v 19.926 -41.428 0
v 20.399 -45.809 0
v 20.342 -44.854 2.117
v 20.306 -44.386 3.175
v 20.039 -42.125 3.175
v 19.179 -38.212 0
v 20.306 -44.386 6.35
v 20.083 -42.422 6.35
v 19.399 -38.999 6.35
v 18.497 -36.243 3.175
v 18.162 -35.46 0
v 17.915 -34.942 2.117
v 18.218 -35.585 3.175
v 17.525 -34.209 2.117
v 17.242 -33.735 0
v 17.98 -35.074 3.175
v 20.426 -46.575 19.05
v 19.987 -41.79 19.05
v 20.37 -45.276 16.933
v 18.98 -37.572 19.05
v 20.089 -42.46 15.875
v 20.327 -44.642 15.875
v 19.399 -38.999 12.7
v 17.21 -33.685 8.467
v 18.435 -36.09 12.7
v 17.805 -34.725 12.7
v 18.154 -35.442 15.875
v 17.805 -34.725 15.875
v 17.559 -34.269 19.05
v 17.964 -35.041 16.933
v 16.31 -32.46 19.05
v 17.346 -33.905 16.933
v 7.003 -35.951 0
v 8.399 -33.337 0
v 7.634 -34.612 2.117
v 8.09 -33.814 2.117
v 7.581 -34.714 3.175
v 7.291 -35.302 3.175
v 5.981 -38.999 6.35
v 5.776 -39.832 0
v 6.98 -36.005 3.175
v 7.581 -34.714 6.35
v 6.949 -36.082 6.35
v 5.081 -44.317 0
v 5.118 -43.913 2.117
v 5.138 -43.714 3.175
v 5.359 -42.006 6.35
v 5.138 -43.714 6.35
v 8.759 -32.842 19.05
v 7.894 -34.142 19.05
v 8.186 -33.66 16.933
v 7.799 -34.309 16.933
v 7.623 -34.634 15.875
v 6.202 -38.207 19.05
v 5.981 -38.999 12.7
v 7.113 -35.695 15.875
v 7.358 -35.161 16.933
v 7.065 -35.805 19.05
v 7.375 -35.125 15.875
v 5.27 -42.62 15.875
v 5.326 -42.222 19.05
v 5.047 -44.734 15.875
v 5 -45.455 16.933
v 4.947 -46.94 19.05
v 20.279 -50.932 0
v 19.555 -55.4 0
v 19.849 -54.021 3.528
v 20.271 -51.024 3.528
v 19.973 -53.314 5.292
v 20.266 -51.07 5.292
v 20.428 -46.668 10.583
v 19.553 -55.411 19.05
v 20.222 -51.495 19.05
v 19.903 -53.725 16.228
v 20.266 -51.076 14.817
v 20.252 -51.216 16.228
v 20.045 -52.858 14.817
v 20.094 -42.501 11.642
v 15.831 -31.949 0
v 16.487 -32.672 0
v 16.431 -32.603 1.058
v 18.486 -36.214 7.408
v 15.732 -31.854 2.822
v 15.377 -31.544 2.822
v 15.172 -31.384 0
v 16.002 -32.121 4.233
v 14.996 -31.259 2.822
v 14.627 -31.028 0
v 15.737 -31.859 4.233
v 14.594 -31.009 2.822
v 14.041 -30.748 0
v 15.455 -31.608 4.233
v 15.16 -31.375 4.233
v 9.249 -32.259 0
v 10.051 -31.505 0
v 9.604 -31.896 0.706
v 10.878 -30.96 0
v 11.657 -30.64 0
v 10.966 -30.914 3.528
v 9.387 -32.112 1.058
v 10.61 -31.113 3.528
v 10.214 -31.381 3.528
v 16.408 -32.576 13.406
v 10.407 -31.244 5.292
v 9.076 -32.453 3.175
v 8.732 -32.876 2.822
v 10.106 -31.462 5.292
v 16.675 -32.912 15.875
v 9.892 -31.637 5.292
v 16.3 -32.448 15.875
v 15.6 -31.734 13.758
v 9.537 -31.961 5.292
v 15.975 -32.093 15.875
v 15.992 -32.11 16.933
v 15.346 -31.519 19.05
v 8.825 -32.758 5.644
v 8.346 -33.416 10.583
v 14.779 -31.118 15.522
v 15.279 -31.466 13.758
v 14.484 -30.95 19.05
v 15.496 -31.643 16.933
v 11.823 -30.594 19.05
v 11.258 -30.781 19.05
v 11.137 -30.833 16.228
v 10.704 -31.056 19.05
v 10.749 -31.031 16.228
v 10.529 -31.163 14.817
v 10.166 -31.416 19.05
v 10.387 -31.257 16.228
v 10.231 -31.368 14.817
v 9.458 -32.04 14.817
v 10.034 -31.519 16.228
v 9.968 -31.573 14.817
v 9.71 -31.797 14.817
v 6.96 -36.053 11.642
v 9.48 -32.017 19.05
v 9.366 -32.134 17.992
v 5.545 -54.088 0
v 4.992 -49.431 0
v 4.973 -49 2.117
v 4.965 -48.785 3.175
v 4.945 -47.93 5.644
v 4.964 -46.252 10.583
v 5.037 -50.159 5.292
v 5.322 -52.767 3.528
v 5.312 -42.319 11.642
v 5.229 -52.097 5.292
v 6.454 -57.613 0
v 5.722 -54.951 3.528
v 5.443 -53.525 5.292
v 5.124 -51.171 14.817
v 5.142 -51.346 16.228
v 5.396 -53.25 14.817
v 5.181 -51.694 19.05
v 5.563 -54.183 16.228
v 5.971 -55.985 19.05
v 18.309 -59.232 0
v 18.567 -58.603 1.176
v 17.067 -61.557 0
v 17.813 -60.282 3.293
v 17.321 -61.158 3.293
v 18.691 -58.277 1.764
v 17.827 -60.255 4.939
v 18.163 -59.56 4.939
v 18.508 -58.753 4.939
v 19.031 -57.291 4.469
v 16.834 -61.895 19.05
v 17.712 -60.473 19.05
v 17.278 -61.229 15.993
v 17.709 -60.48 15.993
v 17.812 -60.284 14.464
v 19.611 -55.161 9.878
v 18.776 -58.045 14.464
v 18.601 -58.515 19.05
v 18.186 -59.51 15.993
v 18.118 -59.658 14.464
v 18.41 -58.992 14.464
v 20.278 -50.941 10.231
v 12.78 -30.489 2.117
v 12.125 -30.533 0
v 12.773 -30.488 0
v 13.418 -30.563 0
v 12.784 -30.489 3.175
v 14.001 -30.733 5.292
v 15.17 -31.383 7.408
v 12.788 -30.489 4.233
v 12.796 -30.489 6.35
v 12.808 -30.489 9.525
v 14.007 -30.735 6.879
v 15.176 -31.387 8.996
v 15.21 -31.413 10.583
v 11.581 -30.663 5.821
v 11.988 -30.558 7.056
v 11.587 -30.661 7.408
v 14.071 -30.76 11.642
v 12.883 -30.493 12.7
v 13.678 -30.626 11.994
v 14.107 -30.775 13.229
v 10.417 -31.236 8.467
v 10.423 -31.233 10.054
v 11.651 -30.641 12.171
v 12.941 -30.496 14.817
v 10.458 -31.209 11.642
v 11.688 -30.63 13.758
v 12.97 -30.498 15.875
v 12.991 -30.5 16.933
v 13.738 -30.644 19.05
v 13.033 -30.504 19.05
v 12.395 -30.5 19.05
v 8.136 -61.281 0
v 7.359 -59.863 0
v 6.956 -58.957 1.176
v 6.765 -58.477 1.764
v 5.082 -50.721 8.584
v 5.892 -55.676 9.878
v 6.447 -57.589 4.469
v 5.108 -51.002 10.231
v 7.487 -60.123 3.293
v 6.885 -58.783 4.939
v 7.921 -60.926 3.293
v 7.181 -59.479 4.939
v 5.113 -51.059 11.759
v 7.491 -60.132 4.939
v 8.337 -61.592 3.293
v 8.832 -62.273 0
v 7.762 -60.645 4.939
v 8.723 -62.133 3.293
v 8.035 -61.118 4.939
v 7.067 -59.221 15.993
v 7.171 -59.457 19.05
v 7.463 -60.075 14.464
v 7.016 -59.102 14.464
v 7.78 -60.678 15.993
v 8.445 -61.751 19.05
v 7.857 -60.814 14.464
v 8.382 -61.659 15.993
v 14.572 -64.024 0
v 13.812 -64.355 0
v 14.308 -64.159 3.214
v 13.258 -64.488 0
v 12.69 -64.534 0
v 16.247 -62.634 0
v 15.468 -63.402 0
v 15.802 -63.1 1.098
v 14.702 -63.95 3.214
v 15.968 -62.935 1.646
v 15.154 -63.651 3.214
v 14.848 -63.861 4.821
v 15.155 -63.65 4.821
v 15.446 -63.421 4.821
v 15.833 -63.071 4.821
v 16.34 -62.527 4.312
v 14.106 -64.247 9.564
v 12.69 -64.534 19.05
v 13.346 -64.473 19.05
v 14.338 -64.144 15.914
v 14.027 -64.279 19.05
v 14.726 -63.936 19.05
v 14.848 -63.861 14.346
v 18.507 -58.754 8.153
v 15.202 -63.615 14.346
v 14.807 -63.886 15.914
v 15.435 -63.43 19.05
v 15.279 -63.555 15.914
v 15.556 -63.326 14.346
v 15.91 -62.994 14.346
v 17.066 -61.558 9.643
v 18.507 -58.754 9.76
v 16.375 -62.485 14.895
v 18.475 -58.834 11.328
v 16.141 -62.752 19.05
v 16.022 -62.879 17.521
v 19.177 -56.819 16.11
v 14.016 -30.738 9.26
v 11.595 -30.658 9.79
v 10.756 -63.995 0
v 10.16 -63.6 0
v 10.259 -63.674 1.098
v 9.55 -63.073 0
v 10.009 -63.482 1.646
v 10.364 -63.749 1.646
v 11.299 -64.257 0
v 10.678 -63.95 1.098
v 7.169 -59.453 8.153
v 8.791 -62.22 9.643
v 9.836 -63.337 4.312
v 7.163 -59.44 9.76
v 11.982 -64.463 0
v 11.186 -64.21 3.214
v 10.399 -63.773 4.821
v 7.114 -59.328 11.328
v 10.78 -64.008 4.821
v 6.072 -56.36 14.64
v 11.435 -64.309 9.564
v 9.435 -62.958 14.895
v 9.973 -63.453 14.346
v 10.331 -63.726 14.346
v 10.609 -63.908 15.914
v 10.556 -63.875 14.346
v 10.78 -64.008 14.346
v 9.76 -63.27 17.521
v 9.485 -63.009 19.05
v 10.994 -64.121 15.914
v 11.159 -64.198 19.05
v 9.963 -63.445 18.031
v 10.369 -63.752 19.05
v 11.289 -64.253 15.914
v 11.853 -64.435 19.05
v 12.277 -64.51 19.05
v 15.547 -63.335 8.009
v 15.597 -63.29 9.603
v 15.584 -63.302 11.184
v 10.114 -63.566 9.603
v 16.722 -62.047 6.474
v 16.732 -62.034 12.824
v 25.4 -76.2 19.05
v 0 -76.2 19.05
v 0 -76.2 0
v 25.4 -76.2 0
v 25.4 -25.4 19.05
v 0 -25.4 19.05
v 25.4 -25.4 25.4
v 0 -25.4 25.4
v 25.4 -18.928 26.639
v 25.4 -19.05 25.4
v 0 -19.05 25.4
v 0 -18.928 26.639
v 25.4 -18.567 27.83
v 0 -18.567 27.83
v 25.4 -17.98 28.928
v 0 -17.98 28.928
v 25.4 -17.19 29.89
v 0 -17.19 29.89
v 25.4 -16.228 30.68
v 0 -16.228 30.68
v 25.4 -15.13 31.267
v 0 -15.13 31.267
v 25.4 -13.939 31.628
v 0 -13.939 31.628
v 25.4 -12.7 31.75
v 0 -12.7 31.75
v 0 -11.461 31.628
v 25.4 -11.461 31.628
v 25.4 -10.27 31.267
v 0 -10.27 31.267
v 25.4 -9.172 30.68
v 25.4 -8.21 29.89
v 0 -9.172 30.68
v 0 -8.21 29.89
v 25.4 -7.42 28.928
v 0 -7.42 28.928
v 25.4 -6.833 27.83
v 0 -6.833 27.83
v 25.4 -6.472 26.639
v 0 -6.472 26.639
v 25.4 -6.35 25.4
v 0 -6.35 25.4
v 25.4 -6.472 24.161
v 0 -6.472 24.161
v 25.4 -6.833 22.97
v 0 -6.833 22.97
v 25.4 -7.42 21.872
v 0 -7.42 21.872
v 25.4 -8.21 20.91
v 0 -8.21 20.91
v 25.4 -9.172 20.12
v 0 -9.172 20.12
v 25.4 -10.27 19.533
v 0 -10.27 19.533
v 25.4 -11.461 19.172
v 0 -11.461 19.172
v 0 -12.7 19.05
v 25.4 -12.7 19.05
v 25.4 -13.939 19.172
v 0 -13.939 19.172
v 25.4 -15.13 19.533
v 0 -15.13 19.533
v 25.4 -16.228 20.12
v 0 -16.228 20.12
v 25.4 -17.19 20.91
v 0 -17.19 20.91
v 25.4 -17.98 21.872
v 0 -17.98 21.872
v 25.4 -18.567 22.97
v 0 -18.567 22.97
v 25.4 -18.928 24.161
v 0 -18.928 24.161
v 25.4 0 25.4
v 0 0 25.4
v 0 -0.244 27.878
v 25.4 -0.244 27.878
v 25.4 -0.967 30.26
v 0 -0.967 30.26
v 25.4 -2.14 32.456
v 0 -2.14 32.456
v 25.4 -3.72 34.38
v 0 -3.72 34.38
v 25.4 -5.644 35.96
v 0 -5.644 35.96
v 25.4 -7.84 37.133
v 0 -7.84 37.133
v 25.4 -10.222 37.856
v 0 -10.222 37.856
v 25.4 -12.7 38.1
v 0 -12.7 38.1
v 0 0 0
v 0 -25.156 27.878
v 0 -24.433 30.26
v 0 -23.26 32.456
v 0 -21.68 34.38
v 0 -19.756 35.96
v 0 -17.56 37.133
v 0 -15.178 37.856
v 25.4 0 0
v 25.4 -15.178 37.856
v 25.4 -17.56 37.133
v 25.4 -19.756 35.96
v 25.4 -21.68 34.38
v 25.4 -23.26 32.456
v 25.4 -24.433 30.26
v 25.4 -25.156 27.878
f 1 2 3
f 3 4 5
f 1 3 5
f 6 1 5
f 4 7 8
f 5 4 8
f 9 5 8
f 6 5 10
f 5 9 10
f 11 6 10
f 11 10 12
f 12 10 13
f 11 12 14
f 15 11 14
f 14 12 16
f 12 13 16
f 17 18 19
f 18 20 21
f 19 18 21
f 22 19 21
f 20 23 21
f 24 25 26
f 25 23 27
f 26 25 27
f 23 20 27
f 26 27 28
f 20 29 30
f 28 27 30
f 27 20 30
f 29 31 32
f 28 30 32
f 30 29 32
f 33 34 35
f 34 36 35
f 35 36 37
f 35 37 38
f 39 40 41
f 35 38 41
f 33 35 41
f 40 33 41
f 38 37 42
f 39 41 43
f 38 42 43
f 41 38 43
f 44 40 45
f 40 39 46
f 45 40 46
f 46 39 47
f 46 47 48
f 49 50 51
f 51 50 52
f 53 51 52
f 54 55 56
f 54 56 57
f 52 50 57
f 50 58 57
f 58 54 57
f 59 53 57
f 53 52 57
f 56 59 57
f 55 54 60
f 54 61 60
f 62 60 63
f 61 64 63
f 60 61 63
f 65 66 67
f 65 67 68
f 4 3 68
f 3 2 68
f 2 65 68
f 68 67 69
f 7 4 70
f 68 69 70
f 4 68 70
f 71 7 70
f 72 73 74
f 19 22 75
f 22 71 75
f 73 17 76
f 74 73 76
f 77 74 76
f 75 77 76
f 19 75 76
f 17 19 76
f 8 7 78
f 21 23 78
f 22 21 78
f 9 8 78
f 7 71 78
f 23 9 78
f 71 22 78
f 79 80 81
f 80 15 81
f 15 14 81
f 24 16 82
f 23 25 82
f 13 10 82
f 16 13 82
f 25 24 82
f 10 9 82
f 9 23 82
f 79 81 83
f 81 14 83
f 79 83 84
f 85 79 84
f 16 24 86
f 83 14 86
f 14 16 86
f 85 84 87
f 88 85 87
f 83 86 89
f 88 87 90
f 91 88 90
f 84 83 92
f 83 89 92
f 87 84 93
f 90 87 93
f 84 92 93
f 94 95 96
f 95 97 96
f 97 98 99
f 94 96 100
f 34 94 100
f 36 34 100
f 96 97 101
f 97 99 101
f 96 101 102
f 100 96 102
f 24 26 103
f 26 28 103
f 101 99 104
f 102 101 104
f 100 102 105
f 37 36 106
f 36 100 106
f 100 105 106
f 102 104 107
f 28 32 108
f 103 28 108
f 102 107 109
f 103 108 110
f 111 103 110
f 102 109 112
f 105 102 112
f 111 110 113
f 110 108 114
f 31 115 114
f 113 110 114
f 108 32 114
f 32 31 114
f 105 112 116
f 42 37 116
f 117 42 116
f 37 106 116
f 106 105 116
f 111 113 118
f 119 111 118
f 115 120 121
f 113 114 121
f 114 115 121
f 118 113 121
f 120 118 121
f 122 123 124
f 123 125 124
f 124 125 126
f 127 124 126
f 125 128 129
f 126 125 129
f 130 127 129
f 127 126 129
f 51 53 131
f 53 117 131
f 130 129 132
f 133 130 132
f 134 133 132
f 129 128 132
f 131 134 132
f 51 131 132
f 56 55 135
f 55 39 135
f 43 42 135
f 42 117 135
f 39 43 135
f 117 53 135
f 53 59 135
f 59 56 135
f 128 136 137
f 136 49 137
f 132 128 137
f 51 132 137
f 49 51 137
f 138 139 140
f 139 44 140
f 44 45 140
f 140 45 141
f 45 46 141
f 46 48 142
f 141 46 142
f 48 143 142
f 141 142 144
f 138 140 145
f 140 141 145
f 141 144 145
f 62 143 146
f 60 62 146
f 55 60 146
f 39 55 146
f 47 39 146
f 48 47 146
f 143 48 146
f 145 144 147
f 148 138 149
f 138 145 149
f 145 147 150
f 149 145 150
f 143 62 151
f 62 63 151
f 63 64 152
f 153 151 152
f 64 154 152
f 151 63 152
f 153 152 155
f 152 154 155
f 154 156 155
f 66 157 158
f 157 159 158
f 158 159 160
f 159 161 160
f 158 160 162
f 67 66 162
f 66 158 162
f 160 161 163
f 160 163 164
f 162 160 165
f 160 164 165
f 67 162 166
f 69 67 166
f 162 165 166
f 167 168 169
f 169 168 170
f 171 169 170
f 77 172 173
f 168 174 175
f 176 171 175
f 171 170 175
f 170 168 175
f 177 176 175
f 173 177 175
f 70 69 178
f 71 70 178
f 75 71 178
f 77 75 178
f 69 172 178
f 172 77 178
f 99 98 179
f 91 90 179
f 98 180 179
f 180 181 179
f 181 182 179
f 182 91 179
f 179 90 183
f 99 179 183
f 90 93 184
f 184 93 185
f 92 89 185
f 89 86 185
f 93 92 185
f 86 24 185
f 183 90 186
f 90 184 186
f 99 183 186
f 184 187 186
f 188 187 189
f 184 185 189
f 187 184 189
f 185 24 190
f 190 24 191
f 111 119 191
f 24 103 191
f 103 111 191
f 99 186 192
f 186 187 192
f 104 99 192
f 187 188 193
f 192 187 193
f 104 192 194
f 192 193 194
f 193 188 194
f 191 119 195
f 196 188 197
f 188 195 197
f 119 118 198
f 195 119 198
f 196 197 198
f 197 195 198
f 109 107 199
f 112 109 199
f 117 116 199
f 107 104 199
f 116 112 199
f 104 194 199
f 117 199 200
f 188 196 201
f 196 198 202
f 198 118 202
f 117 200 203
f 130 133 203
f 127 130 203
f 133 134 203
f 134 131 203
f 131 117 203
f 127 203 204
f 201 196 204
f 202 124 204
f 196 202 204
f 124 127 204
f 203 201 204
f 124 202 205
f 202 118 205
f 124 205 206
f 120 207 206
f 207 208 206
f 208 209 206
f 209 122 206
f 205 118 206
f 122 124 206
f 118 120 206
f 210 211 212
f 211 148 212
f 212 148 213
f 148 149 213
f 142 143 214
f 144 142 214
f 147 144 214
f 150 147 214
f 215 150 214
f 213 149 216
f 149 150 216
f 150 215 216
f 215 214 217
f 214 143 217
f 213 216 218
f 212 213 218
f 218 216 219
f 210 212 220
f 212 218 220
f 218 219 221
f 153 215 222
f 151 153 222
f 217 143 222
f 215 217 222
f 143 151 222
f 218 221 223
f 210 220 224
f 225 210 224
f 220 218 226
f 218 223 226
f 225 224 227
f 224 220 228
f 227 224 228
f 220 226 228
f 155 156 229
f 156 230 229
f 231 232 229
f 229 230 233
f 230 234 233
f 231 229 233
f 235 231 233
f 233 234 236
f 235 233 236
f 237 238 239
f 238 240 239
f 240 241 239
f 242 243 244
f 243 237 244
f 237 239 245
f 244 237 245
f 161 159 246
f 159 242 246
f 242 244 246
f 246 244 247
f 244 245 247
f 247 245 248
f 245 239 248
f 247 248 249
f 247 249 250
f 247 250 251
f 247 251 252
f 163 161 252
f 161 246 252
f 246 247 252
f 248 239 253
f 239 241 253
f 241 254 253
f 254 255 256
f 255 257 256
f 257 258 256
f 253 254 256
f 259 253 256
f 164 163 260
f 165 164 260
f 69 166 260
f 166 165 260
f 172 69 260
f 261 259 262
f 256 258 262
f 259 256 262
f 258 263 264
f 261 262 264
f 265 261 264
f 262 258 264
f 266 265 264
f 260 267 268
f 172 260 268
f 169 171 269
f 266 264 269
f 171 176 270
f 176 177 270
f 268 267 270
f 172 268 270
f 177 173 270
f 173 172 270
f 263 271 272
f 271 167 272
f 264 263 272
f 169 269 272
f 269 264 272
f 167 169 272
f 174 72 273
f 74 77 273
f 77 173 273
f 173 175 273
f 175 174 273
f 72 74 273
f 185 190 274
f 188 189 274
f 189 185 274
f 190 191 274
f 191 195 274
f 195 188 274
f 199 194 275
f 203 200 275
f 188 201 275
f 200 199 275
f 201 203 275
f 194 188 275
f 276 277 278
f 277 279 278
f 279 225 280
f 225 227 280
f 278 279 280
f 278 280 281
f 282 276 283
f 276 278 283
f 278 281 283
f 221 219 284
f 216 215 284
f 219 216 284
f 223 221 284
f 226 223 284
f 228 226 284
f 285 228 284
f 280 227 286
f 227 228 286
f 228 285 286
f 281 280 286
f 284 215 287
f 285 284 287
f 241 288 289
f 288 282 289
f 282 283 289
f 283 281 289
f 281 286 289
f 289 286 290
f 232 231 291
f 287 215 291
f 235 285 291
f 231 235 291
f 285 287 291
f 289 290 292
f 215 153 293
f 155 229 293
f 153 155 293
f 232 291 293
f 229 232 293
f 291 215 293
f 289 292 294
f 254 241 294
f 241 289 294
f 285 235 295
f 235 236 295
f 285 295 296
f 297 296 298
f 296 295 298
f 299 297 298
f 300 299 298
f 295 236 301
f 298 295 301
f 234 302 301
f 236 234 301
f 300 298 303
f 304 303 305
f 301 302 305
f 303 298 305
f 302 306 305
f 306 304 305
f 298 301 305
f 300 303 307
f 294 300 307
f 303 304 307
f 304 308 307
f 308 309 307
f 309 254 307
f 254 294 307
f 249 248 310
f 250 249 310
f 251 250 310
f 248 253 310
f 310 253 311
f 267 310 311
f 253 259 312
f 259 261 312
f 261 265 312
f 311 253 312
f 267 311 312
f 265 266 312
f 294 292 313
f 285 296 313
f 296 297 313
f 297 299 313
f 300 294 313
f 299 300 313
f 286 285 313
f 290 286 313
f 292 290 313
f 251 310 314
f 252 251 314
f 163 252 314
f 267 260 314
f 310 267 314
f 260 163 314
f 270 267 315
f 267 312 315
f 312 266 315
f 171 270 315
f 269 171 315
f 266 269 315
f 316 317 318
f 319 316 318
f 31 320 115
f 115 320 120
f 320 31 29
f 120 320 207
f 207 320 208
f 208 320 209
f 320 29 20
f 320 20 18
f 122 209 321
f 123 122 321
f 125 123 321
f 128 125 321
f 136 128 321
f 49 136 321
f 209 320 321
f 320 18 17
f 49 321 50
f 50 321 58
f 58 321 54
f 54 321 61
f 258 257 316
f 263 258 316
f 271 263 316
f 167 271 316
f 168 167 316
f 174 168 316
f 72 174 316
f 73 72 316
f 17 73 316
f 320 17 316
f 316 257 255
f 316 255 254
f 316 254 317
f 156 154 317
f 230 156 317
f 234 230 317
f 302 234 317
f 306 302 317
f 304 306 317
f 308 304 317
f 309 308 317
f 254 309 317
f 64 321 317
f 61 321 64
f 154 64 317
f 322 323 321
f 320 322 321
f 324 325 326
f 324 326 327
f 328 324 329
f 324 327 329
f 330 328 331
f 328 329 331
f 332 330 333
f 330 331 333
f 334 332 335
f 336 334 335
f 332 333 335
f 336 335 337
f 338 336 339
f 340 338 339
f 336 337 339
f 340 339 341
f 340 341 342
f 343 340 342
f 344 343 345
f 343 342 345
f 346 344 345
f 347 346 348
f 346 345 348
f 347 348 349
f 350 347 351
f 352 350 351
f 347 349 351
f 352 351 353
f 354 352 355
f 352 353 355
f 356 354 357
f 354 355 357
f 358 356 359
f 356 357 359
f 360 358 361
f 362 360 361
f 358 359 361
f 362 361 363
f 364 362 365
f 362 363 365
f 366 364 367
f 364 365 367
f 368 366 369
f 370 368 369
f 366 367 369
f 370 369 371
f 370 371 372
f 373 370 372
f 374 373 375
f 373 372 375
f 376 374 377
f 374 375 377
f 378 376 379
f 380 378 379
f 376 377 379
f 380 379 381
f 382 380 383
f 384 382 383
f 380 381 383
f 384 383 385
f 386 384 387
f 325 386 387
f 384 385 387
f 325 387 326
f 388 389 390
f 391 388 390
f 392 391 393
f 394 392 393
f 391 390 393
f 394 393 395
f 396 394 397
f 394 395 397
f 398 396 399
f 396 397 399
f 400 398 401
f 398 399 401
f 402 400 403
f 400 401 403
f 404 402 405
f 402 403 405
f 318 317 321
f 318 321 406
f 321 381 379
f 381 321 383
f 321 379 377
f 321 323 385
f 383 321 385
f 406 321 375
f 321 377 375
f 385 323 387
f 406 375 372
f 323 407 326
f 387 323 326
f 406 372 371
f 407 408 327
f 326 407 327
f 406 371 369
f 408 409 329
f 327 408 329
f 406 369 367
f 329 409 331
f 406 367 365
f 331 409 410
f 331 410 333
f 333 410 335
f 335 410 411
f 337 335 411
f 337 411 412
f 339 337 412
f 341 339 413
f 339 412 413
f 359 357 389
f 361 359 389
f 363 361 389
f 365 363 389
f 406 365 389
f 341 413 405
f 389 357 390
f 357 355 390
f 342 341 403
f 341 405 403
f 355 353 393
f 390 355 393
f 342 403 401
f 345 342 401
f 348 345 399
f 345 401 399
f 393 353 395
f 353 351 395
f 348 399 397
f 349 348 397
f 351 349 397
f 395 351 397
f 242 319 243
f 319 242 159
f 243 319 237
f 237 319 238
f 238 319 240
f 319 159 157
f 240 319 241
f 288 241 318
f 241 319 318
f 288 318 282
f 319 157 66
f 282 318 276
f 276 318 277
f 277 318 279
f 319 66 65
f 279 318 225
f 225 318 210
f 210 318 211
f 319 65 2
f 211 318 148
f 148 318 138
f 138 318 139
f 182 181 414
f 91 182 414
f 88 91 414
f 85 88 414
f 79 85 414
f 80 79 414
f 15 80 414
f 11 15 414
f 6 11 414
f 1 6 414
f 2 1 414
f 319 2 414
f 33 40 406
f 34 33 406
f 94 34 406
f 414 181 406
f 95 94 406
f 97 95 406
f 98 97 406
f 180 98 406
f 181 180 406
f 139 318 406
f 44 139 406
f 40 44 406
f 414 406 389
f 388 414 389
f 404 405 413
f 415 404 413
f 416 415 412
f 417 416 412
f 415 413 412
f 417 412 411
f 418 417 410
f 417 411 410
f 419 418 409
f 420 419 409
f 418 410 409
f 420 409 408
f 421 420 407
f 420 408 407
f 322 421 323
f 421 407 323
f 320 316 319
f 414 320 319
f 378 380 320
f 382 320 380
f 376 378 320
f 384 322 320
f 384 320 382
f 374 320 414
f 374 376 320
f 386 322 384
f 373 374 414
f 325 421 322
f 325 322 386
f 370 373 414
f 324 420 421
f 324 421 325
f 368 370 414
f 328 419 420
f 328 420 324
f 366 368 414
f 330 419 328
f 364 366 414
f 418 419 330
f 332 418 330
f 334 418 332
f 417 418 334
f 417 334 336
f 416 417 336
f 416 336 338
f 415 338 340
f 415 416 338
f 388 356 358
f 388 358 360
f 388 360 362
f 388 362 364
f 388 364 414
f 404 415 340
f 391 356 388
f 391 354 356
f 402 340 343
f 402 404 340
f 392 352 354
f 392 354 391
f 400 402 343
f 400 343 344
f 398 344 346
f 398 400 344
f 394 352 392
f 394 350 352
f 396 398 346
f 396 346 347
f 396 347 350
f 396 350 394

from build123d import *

# Parameters (mm, degrees)
F1_DEPTH = 25.4
F2_R     = 6.35
F3_DEPTH = 25.4
F6_DEPTH = 25.4


with BuildPart() as f1:
    # F0 (on Right) → F1 (new body)
    with BuildSketch(Plane.YZ):
        Polygon((-76.2, 0), (0, 0), (0, 38.1), (-25.4, 38.1), (-25.4, 19.05), (-76.2, 19.05), align=None)
    extrude(amount=F1_DEPTH)

    # F2 (on face) → F3 (cut)
    with BuildSketch(Plane(origin=(0, 0, 0), x_dir=(0, -1, 0), z_dir=(-1, 0, 0))):
        with Locations((12.7, 25.4)):
            Circle(F2_R)
        with BuildLine():
            ThreePointArc((0, 25.4), (3.719744, 34.380256), (12.7, 38.1))
            Line((12.7, 38.1), (0, 38.1))
            Line((0, 38.1), (0, 25.4))
        make_face()
        with BuildLine():
            ThreePointArc((12.7, 38.1), (21.680256, 34.380256), (25.4, 25.4))
            Line((25.4, 25.4), (25.4, 38.1))
            Line((25.4, 38.1), (12.7, 38.1))
        make_face()
    extrude(amount=-F3_DEPTH, mode=Mode.SUBTRACT)

    # F5 (on face) → F6 (cut)
    with BuildSketch(Plane.XY.offset(19.05)):
        with BuildLine():
            add(Edge.make_bspline(
                [(12.690173, -64.53418), (26.108709, -64.53418), (19.399441, -38.999069), (12.690173, -13.463959), (5.980906, -38.999069), (-0.728362, -64.53418), (12.690173, -64.53418)],
                knots=[0, 0, 0, 2.094395, 2.094395, 4.18879, 4.18879, 6.283185, 6.283185, 6.283185], degree=2, weights=[1, 0.5, 1, 0.5, 1, 0.5, 1]))
        make_face()
    extrude(amount=-F6_DEPTH, mode=Mode.SUBTRACT)


solid = f1.part
